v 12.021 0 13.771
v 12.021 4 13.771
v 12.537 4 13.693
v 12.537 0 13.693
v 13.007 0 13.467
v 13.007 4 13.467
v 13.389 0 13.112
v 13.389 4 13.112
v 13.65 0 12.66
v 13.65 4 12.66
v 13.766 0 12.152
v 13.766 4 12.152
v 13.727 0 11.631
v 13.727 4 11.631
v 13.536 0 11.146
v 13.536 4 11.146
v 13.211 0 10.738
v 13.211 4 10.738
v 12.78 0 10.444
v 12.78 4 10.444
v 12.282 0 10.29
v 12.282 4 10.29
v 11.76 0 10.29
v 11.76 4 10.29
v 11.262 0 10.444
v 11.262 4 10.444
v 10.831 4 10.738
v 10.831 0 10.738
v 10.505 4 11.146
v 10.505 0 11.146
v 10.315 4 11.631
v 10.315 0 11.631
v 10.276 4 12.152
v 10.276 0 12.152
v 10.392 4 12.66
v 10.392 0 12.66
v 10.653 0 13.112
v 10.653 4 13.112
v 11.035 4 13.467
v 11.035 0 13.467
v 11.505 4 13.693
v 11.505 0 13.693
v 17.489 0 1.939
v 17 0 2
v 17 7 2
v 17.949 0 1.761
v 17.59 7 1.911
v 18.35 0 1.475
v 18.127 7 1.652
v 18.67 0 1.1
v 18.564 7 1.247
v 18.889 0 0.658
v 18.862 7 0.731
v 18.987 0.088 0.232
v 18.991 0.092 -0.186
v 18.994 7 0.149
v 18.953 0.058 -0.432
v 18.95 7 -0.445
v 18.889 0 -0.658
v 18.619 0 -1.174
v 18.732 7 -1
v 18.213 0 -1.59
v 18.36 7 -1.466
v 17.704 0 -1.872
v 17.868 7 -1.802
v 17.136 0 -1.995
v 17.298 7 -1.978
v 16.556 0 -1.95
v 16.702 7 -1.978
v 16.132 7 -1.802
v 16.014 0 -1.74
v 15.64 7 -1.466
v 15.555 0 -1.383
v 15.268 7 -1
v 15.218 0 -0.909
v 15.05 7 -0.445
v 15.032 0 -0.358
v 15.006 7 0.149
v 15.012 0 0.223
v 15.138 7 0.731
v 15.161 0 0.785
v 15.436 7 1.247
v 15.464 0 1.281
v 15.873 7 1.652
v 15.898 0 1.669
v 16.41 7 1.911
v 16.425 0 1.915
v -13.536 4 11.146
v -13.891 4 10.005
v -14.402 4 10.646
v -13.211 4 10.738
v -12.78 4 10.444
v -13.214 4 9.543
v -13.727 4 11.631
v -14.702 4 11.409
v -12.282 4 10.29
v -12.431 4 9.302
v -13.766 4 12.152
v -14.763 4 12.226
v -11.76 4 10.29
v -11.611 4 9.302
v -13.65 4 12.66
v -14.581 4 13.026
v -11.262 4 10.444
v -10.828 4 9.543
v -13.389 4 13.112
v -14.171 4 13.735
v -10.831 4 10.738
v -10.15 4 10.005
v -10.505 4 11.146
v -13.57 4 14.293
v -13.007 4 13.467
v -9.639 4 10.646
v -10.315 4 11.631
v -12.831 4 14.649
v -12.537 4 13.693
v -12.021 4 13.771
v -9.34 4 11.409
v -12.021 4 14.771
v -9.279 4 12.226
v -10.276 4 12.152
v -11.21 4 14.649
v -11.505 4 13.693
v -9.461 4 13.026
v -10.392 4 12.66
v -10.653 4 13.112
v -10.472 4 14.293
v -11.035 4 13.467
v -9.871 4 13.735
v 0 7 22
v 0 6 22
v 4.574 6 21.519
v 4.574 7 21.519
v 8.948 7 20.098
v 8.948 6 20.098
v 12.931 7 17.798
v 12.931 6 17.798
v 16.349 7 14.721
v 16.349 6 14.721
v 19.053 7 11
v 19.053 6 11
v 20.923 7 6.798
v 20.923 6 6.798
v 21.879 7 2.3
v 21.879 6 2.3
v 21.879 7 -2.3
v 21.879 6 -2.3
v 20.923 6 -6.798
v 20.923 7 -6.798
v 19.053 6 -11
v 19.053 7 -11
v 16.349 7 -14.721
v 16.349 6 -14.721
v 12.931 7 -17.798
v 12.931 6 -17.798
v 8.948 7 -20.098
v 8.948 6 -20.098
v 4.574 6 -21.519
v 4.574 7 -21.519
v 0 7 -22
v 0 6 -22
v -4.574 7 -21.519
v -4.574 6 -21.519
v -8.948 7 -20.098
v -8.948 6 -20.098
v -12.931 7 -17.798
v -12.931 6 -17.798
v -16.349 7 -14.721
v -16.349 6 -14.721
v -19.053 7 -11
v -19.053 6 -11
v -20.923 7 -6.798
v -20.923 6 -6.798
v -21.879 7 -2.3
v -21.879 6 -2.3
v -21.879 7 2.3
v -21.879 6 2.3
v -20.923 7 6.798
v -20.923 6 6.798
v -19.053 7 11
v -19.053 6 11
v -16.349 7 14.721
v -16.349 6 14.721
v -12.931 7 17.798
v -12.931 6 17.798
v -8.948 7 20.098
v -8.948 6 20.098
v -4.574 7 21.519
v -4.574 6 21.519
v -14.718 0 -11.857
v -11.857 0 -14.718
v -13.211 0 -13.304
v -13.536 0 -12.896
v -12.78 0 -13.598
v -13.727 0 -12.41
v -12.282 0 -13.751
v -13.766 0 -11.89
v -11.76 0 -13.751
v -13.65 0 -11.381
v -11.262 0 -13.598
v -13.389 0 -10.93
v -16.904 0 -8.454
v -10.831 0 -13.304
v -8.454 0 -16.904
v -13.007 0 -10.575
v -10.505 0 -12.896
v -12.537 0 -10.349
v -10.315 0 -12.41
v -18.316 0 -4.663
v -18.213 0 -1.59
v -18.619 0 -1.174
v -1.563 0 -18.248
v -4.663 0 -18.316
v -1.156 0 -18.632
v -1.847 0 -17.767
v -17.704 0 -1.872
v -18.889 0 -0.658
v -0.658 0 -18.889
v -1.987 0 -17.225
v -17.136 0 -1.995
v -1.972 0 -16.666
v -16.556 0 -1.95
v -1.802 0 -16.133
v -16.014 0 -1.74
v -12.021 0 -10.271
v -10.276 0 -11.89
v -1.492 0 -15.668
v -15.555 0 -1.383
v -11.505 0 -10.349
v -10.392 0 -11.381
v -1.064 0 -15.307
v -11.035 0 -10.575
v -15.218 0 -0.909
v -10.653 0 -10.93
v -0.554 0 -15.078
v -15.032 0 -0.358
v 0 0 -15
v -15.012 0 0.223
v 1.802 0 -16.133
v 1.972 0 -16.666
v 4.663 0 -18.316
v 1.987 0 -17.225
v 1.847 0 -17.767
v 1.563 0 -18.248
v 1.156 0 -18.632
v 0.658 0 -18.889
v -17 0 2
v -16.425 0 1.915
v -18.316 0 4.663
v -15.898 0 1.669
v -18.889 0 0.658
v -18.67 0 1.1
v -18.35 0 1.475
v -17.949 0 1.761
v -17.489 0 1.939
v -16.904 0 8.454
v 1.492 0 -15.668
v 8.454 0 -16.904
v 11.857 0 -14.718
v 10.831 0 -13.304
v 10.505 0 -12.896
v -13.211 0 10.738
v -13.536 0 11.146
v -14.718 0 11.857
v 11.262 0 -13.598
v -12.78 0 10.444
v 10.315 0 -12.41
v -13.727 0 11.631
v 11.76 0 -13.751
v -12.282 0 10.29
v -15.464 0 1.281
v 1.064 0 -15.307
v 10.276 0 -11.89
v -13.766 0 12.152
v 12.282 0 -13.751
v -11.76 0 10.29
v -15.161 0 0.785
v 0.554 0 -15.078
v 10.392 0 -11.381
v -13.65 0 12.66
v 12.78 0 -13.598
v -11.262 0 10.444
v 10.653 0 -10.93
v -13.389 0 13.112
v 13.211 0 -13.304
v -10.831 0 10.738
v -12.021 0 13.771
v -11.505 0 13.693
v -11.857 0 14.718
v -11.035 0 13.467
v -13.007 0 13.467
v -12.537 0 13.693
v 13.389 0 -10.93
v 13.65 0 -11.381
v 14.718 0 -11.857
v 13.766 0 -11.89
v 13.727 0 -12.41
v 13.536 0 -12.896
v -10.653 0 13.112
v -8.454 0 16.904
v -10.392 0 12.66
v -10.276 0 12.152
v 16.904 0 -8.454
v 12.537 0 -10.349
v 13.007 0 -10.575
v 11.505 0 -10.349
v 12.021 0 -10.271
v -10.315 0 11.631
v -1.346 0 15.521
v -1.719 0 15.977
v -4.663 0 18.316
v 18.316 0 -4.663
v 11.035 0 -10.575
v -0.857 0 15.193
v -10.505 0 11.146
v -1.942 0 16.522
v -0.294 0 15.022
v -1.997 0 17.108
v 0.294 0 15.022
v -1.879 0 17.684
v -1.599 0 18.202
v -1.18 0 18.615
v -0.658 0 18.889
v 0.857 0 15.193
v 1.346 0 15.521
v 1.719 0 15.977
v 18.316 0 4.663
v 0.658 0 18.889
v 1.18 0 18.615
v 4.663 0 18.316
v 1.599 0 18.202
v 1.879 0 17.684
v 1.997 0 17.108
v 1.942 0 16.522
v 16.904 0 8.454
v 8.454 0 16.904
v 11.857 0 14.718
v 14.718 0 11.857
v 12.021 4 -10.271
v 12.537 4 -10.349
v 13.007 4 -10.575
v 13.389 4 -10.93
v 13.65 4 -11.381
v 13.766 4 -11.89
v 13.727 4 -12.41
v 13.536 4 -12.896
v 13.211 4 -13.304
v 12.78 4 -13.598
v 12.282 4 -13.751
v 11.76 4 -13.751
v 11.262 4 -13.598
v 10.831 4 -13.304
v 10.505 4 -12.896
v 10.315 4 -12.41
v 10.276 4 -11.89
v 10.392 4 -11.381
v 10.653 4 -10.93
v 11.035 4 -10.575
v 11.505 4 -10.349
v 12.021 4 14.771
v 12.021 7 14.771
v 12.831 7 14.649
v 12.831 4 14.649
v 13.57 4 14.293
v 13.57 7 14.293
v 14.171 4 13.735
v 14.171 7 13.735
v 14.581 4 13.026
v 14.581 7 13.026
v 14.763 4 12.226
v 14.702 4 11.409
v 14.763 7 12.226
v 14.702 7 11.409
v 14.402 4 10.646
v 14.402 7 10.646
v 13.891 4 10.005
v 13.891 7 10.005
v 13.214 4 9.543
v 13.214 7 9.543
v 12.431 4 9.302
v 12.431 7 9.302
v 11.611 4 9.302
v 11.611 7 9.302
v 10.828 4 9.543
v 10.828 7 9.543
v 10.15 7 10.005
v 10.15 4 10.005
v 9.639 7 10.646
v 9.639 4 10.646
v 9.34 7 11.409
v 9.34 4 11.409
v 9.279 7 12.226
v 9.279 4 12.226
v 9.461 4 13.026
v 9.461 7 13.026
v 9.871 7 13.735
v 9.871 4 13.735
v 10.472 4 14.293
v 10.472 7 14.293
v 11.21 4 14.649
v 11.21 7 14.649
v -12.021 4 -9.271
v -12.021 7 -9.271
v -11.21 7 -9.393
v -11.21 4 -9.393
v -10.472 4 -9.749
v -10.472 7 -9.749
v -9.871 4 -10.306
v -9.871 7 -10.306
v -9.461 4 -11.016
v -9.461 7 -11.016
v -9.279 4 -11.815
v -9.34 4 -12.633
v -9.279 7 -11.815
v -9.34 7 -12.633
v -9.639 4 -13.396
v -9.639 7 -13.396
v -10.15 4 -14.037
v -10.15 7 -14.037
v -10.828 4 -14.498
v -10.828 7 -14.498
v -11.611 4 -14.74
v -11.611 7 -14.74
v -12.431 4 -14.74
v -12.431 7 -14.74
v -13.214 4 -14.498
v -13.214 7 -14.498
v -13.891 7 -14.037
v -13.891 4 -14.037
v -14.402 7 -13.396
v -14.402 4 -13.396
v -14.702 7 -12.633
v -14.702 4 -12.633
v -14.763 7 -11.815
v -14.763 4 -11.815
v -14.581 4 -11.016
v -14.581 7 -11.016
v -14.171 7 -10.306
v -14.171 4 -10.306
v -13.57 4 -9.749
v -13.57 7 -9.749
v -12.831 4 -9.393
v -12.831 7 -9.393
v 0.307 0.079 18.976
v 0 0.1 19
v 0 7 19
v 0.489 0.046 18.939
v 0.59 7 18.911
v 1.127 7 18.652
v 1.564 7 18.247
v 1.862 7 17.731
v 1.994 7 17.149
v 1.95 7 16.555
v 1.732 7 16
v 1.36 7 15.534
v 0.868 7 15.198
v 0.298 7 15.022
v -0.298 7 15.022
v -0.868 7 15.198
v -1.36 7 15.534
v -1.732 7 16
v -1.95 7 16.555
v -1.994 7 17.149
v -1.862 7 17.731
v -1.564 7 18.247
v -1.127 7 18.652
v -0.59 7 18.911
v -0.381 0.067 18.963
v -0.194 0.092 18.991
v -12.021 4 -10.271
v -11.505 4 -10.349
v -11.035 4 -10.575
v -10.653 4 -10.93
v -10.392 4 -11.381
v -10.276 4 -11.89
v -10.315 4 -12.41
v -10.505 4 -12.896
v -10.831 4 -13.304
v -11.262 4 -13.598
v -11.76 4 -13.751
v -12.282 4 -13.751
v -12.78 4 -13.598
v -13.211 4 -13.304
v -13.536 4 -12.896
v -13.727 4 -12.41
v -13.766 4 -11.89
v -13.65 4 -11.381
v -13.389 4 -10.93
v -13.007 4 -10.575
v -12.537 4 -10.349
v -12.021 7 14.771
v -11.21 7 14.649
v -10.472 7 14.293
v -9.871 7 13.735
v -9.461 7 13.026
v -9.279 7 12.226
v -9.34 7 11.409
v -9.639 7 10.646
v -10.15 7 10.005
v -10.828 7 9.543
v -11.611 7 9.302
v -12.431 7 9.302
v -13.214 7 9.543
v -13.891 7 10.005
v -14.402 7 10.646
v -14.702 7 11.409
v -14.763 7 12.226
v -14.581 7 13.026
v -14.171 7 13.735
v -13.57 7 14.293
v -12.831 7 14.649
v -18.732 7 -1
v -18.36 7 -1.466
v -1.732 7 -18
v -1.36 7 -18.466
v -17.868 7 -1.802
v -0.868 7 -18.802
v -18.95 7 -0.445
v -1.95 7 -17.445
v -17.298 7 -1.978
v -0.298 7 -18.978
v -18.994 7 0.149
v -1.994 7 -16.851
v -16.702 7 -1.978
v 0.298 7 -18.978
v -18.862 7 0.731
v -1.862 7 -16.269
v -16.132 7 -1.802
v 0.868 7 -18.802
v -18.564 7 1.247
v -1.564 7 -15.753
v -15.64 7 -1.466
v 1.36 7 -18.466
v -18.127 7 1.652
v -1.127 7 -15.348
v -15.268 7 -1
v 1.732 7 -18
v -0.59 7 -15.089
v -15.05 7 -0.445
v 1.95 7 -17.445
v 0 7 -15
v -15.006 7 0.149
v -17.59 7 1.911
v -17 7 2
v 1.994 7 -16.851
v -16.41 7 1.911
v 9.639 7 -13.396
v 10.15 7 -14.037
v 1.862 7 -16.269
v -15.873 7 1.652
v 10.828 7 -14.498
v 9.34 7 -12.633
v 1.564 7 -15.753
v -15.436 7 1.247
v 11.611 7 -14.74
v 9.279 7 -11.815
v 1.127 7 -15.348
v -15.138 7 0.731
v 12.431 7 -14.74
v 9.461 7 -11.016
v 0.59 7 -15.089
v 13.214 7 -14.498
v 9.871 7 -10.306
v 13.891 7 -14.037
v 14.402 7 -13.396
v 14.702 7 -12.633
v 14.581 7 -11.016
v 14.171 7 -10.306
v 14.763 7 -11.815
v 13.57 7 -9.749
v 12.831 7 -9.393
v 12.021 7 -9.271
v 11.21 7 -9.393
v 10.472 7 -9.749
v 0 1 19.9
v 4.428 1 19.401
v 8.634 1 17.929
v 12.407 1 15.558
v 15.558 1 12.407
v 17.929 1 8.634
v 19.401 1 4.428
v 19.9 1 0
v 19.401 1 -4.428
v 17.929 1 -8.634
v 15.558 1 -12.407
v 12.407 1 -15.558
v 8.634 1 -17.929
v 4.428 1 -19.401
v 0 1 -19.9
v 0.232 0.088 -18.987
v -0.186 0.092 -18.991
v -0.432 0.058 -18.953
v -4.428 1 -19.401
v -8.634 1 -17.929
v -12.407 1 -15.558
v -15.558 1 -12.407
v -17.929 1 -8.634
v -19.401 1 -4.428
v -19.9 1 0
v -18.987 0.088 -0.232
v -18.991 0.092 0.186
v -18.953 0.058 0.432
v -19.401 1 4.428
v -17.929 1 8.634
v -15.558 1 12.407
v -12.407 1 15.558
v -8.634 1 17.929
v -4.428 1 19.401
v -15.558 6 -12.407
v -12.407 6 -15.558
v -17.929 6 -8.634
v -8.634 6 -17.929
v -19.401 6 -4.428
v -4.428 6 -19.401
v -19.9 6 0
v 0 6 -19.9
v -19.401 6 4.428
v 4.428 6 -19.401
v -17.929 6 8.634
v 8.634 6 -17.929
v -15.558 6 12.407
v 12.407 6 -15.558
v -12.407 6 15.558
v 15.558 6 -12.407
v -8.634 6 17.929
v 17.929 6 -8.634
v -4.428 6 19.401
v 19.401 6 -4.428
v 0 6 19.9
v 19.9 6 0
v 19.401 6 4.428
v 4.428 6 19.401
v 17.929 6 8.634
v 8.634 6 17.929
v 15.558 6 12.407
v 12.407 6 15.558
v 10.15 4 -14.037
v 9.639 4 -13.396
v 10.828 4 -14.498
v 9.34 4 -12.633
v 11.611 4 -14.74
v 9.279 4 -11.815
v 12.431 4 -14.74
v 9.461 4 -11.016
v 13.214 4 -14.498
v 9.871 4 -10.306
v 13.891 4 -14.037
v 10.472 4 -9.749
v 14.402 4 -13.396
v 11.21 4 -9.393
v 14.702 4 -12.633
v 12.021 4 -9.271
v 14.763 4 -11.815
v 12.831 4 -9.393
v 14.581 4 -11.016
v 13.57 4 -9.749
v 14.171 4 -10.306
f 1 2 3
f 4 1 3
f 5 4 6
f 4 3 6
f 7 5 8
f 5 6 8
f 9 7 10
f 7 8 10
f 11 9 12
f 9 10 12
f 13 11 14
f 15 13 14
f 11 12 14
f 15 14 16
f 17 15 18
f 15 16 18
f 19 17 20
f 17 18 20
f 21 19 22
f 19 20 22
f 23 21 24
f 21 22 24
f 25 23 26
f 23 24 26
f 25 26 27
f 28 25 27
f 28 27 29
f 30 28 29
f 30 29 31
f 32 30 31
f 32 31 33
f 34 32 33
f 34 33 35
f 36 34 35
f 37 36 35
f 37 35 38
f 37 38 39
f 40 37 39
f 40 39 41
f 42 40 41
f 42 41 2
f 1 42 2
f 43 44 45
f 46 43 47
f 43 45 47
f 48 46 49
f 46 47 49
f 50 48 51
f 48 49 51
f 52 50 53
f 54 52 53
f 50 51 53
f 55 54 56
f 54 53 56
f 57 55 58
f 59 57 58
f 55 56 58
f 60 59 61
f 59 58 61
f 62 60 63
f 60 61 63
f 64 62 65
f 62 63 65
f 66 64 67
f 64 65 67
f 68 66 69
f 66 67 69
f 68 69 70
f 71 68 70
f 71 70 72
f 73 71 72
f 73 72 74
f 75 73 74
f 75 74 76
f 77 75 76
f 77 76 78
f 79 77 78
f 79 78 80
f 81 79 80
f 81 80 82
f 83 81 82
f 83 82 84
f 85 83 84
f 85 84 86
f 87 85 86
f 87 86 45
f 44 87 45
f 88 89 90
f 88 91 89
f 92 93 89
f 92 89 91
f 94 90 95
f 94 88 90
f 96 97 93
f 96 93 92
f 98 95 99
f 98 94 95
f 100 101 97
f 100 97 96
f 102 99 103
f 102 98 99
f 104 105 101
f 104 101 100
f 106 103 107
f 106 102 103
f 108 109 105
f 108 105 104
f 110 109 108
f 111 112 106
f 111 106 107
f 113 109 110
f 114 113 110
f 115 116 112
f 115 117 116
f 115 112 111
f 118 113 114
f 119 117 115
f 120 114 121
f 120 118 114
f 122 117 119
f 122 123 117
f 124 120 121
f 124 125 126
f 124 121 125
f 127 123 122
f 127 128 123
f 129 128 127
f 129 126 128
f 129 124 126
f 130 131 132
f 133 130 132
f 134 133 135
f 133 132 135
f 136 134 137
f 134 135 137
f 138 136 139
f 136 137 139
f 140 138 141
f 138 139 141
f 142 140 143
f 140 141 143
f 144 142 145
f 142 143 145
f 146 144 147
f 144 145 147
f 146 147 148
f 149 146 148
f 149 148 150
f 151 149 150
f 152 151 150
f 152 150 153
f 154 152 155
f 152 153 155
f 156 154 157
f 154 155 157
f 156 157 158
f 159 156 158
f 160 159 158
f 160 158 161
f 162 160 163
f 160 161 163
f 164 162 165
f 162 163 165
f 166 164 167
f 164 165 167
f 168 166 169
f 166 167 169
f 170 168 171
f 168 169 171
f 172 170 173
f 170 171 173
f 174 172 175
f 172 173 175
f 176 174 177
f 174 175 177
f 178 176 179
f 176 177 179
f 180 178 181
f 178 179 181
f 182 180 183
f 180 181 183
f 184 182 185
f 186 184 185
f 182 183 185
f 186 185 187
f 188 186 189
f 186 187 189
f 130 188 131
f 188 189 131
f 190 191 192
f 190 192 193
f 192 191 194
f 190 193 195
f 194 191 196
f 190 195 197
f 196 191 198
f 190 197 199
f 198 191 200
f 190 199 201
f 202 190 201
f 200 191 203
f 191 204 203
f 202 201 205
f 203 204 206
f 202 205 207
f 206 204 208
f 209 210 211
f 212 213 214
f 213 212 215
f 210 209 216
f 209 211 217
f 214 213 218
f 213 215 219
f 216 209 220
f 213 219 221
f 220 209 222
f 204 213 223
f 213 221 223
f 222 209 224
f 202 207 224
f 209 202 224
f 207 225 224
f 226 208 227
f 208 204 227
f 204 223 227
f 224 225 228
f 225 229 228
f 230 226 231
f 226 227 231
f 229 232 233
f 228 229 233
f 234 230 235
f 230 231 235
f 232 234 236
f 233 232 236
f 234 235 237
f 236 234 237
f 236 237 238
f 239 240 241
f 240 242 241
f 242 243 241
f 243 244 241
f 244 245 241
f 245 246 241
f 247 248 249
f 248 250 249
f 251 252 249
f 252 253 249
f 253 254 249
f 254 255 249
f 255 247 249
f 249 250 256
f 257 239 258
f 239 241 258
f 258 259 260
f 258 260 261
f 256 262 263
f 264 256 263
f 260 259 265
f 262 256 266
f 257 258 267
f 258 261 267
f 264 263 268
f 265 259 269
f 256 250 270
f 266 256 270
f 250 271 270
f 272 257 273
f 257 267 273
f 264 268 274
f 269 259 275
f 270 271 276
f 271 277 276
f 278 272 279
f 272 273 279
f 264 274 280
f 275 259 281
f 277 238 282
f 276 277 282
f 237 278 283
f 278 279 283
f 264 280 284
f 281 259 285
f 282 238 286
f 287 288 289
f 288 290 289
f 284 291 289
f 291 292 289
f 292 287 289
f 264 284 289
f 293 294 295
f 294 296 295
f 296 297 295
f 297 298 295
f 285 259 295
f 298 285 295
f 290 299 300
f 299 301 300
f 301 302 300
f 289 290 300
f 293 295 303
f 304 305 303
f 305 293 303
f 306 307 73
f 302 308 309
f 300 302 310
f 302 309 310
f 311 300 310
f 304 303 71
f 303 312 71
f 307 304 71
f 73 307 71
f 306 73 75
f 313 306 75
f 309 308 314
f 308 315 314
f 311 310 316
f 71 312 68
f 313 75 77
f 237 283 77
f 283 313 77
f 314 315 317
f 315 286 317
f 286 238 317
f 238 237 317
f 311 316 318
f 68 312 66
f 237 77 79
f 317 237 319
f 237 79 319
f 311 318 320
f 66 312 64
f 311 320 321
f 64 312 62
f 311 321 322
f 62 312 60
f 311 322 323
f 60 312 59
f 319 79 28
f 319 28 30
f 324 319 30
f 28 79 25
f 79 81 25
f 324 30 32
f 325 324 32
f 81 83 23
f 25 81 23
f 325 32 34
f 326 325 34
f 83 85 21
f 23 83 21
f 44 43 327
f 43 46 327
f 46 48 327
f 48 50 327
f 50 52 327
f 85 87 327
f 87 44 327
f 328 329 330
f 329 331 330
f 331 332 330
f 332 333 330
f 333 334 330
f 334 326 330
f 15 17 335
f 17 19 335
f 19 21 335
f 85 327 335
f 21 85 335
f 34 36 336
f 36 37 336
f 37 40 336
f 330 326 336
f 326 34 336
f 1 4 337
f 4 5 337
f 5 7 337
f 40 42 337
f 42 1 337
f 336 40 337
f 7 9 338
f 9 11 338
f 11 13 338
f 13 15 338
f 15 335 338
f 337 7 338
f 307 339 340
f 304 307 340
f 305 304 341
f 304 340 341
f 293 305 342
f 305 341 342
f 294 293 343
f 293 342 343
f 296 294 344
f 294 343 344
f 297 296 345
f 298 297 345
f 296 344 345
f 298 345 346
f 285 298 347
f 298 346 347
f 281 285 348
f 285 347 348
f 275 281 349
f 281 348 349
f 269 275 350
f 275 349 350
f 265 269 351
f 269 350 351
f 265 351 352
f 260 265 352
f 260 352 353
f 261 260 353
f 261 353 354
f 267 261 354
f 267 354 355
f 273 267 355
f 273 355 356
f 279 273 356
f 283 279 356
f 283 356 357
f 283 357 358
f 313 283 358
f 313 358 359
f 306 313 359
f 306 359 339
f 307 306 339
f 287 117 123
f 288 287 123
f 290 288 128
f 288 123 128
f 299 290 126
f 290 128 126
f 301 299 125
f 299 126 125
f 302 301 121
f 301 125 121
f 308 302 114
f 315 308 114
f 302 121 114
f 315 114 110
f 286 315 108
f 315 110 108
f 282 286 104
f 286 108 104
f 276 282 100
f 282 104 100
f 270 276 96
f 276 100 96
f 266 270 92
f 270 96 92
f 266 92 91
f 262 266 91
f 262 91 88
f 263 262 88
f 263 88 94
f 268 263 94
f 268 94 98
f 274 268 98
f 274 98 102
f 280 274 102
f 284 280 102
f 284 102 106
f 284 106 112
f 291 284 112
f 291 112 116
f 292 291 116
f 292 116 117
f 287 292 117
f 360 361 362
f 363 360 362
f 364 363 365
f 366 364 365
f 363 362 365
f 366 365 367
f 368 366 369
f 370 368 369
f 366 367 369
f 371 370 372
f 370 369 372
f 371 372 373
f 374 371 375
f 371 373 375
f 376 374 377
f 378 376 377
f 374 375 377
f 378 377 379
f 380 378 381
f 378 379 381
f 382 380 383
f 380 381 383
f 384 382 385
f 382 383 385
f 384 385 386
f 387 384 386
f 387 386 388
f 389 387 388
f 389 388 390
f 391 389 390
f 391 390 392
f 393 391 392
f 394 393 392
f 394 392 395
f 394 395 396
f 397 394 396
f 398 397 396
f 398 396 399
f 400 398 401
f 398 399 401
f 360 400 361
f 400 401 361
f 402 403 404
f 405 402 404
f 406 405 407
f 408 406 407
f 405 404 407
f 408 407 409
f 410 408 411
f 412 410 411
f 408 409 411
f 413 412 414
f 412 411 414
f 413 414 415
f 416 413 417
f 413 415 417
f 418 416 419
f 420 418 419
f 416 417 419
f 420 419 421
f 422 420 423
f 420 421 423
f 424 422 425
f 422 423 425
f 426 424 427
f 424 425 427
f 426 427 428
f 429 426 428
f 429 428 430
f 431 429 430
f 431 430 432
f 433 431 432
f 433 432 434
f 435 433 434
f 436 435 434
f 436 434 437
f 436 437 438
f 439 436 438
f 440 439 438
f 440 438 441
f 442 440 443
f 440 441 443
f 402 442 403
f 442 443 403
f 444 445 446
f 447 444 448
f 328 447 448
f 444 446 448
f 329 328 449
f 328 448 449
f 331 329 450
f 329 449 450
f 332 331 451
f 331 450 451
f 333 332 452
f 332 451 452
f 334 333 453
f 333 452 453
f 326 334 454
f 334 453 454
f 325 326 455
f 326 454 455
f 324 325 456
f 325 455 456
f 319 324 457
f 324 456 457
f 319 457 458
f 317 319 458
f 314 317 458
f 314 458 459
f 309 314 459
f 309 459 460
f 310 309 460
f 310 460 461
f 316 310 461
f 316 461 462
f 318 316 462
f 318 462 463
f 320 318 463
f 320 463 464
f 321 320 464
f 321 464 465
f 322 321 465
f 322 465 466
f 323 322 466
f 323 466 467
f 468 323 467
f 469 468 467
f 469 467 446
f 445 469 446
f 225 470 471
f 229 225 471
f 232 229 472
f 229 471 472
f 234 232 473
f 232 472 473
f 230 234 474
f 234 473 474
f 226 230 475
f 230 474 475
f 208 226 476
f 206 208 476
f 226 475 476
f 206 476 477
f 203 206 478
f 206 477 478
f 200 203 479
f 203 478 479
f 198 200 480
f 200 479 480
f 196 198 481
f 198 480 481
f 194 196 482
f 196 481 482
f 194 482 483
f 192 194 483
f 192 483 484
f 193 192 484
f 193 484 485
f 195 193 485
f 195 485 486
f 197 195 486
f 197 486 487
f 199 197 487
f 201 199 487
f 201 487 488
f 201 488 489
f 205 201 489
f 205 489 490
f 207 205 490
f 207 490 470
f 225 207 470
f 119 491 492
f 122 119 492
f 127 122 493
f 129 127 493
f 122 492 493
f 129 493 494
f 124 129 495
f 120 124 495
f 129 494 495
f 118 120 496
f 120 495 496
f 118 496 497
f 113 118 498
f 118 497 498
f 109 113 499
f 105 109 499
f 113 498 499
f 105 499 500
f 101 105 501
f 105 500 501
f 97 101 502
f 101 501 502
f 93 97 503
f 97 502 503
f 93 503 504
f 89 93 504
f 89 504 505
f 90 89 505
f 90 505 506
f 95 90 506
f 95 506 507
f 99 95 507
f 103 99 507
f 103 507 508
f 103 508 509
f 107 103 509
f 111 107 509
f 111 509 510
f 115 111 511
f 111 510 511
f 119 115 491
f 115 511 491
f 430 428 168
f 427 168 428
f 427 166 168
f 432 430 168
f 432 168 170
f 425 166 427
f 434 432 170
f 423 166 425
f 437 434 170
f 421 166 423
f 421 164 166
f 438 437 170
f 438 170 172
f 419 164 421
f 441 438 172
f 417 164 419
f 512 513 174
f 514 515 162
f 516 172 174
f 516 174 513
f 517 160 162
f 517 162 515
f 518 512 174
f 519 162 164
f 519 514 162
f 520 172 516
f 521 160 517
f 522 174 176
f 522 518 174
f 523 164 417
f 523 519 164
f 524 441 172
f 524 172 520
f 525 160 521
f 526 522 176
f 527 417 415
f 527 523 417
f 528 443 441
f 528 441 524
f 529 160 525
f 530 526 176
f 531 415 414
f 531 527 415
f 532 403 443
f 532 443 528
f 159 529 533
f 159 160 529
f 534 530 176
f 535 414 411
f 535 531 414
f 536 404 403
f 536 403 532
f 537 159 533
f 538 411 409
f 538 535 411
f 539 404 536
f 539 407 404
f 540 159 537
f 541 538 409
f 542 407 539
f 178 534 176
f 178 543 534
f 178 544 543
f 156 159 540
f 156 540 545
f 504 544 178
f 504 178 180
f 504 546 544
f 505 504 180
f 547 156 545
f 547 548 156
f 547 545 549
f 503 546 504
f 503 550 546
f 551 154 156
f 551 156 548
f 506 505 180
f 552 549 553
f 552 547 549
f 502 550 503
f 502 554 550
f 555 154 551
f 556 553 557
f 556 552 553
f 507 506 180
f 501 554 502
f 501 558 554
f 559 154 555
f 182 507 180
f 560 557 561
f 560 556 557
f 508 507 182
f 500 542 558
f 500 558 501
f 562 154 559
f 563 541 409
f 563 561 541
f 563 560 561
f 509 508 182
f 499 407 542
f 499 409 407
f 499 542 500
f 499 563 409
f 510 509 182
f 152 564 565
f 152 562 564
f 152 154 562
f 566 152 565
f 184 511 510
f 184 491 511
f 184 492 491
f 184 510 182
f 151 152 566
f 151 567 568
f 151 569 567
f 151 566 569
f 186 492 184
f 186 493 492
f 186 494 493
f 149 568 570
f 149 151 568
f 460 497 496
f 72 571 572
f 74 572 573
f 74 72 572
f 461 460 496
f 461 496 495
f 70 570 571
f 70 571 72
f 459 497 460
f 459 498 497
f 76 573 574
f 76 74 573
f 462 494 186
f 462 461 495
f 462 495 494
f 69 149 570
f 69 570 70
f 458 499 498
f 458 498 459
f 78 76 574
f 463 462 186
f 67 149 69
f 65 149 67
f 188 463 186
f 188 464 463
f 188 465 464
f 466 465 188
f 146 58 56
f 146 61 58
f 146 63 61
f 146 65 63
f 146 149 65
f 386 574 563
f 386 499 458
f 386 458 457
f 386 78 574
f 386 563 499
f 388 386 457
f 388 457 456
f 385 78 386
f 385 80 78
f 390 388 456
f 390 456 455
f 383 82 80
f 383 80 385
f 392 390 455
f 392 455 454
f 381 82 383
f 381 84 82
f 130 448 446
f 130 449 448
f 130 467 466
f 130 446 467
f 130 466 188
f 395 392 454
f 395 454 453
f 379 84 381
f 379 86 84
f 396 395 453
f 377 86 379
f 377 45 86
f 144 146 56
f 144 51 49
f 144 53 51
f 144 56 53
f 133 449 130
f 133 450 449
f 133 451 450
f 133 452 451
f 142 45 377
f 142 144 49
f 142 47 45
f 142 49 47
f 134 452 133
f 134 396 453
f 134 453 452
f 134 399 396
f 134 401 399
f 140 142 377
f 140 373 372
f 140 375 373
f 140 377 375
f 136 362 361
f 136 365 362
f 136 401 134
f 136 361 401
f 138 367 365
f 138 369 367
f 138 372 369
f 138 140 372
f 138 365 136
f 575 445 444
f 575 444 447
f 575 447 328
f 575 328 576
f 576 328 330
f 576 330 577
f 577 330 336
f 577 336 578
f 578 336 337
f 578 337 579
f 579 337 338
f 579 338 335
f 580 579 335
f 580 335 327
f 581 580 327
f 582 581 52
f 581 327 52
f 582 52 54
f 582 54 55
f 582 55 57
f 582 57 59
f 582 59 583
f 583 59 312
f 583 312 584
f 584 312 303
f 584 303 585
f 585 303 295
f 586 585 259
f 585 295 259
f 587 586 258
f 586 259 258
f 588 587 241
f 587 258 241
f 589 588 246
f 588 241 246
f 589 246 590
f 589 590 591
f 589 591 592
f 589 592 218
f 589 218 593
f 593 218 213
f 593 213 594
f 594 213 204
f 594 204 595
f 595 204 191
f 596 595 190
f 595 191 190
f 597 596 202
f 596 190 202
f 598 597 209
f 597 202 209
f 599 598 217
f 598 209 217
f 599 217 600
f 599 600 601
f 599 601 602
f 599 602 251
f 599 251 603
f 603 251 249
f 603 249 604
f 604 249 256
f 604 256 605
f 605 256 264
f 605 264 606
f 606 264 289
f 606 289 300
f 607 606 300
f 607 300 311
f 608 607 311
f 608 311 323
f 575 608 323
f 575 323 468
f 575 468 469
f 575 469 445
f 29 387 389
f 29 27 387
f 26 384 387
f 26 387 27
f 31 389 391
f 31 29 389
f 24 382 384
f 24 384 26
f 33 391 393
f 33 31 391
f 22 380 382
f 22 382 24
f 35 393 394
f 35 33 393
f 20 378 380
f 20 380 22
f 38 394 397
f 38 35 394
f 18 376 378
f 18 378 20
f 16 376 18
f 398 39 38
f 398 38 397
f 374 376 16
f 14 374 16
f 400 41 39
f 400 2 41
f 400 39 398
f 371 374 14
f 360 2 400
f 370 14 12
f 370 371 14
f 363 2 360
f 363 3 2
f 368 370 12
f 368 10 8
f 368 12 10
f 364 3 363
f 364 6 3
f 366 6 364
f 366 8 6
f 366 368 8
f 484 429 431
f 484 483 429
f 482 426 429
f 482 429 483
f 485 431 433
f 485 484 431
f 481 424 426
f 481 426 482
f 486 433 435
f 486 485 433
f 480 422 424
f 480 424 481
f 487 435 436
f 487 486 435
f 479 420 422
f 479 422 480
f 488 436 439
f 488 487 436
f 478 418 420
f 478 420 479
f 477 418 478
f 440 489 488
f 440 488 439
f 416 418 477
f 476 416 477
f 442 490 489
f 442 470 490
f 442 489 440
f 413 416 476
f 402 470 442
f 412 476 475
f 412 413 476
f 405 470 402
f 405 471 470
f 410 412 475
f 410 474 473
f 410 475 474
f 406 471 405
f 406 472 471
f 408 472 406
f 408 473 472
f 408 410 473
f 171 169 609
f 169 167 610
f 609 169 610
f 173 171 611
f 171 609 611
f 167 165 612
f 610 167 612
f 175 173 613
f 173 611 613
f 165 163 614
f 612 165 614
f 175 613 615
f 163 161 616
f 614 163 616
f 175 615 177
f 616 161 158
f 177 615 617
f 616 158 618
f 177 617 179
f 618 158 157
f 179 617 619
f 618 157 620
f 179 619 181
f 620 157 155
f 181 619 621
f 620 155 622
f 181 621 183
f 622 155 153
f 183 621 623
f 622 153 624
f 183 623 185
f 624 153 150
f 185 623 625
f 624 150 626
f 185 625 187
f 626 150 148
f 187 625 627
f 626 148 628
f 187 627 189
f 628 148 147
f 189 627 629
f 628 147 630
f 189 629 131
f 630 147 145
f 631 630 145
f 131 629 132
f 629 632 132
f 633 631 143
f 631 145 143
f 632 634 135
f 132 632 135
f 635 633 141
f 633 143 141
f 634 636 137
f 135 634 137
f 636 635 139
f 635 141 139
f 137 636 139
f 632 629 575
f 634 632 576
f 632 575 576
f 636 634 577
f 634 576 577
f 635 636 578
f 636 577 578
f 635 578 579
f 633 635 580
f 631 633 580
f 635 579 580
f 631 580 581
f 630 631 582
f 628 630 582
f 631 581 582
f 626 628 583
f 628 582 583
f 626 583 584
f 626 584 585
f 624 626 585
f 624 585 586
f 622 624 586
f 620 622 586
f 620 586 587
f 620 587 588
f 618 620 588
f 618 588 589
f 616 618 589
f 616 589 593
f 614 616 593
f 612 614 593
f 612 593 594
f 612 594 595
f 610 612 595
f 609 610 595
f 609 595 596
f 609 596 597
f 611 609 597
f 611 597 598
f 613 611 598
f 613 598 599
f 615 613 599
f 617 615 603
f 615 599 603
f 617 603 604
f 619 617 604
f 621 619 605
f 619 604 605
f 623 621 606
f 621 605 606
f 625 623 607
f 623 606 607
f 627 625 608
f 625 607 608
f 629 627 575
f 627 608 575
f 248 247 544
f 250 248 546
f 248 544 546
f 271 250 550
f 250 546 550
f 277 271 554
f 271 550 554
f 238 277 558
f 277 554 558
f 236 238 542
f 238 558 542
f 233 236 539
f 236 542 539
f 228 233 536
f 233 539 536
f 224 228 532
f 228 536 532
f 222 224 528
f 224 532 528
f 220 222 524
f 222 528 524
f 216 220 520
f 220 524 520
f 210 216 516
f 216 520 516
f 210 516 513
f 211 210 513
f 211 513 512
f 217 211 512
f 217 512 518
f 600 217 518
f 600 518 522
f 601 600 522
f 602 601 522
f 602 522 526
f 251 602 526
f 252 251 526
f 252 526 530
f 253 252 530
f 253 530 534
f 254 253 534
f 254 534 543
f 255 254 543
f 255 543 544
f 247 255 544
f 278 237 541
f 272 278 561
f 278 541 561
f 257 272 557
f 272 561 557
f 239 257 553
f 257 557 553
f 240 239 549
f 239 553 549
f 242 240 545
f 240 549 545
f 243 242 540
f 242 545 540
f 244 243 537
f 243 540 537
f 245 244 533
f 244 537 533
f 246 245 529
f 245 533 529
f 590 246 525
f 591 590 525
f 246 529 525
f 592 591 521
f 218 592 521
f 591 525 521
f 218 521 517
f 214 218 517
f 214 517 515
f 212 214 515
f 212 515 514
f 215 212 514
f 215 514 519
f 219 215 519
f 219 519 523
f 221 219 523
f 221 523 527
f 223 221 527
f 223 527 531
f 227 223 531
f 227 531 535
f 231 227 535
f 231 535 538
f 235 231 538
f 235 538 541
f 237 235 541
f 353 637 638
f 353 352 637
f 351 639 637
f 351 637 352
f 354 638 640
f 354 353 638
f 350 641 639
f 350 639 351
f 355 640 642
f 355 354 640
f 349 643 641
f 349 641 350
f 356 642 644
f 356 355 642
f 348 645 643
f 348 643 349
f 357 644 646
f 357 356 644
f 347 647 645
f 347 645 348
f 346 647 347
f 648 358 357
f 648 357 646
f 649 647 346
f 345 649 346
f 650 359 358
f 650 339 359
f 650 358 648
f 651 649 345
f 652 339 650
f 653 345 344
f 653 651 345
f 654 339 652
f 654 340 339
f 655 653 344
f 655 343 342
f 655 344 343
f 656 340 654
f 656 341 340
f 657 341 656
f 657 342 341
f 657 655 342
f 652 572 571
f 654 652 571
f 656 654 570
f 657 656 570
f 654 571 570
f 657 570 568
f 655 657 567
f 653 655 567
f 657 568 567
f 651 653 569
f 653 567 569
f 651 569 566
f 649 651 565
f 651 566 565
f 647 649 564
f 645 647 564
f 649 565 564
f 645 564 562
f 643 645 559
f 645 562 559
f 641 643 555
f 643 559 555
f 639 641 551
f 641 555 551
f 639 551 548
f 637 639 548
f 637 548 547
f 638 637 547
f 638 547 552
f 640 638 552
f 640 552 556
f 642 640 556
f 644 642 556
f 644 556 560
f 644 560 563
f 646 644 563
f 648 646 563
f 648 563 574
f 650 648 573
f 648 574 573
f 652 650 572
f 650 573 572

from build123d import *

# Parameters (mm, degrees)
SKETCH1_R           = 19.9
BOSS_EXTRUDE1_DEPTH = 6
SKETCH2_R           = 22
BOSS_EXTRUDE2_DEPTH = 1
SKETCH3_R           = 2
SKETCH3_R_2         = 1.75
CUT_EXTRUDE1_DEPTH  = 32.890437438
SKETCH5_R           = 2.75
SKETCH5_R_2         = 1.75
CUT_EXTRUDE2_DEPTH  = 3
CHAMFER1_SIZE       = 1


with BuildPart() as part:
    # Sketch1 → Boss-Extrude1 (new body)
    with BuildSketch(Plane(origin=(0, 0, 0), x_dir=(1, 0, 0), z_dir=(0, 1, 0))):
        with Locations(Location((0, 0, 0), (0, 0, 270))):
            Circle(SKETCH1_R)
    extrude(amount=BOSS_EXTRUDE1_DEPTH)

    # Sketch2 → Boss-Extrude2 (add)
    with BuildSketch(Plane(origin=(0, 6, 0), x_dir=(1, 0, 0), z_dir=(0, 1, 0))):
        with Locations(Location((0, 0, 0), (0, 0, 270))):
            Circle(SKETCH2_R)
    extrude(amount=BOSS_EXTRUDE2_DEPTH)

    # Sketch3 → Cut-Extrude1 (cut, through all)
    with BuildSketch(Plane(origin=(0, 7, 0), x_dir=(1, 0, 0), z_dir=(0, 1, 0))):
        with Locations(Location((0, 17, 0), (0, 0, 270))):
            Circle(SKETCH3_R)
        with Locations(Location((17, 0, 0), (0, 0, 270))):
            Circle(SKETCH3_R)
        with Locations(Location((0, -17, 0), (0, 0, 270))):
            Circle(SKETCH3_R)
        with Locations(Location((-17, 0, 0), (0, 0, 270))):
            Circle(SKETCH3_R)
        with Locations(Location((-12.02081528, 12.02081528, 0), (0, 0, 270))):
            Circle(SKETCH3_R_2)
        with Locations(Location((12.02081528, 12.02081528, 0), (0, 0, 270))):
            Circle(SKETCH3_R_2)
        with Locations(Location((12.02081528, -12.02081528, 0), (0, 0, 270))):
            Circle(SKETCH3_R_2)
        with Locations(Location((-12.02081528, -12.02081528, 0), (0, 0, 270))):
            Circle(SKETCH3_R_2)
    extrude(amount=-CUT_EXTRUDE1_DEPTH, mode=Mode.SUBTRACT)

    # Sketch5 → Cut-Extrude2 (cut)
    # profile 1 of 4: a face of its own
    with BuildSketch(Plane(origin=(0, 7, 0), x_dir=(1, 0, 0), z_dir=(0, 1, 0))):
        with Locations(Location((-12.02081528, 12.02081528, 0), (0, 0, 270))):
            Circle(SKETCH5_R)
        with Locations(Location((-12.02081528, 12.02081528, 0), (0, 0, 270))):
            Circle(SKETCH5_R_2, mode=Mode.SUBTRACT)
    # profile 2 of 4: a face of its own
    with BuildSketch(Plane(origin=(0, 7, 0), x_dir=(1, 0, 0), z_dir=(0, 1, 0))):
        with Locations(Location((12.02081528, 12.02081528, 0), (0, 0, 270))):
            Circle(SKETCH5_R)
        with Locations(Location((12.02081528, 12.02081528, 0), (0, 0, 270))):
            Circle(SKETCH5_R_2, mode=Mode.SUBTRACT)
    # profile 3 of 4: a face of its own
    with BuildSketch(Plane(origin=(0, 7, 0), x_dir=(1, 0, 0), z_dir=(0, 1, 0))):
        with Locations(Location((12.02081528, -12.02081528, 0), (0, 0, 270))):
            Circle(SKETCH5_R)
        with Locations(Location((12.02081528, -12.02081528, 0), (0, 0, 270))):
            Circle(SKETCH5_R_2, mode=Mode.SUBTRACT)
    # profile 4 of 4: a face of its own
    with BuildSketch(Plane(origin=(0, 7, 0), x_dir=(1, 0, 0), z_dir=(0, 1, 0))):
        with Locations(Location((-12.02081528, -12.02081528, 0), (0, 0, 270))):
            Circle(SKETCH5_R)
        with Locations(Location((-12.02081528, -12.02081528, 0), (0, 0, 270))):
            Circle(SKETCH5_R_2, mode=Mode.SUBTRACT)
    extrude(amount=-CUT_EXTRUDE2_DEPTH, mode=Mode.SUBTRACT)

    # Chamfer1
    # the kernel refuses this chamfer: 1 mm, written as the material it takes off along each edge
    with BuildSketch(Plane(origin=(0, 0, 0), x_dir=(0, 0, 1), z_dir=(-1, 0, 0))) as chamfer1_piece_1:
        Polygon((19.9, CHAMFER1_SIZE), (19.9 - CHAMFER1_SIZE, 0), (19.9, 0), align=None)
    revolve(axis=Axis((0, 0, 0), (0, 1, 0)), mode=Mode.SUBTRACT)


solid = part.part
